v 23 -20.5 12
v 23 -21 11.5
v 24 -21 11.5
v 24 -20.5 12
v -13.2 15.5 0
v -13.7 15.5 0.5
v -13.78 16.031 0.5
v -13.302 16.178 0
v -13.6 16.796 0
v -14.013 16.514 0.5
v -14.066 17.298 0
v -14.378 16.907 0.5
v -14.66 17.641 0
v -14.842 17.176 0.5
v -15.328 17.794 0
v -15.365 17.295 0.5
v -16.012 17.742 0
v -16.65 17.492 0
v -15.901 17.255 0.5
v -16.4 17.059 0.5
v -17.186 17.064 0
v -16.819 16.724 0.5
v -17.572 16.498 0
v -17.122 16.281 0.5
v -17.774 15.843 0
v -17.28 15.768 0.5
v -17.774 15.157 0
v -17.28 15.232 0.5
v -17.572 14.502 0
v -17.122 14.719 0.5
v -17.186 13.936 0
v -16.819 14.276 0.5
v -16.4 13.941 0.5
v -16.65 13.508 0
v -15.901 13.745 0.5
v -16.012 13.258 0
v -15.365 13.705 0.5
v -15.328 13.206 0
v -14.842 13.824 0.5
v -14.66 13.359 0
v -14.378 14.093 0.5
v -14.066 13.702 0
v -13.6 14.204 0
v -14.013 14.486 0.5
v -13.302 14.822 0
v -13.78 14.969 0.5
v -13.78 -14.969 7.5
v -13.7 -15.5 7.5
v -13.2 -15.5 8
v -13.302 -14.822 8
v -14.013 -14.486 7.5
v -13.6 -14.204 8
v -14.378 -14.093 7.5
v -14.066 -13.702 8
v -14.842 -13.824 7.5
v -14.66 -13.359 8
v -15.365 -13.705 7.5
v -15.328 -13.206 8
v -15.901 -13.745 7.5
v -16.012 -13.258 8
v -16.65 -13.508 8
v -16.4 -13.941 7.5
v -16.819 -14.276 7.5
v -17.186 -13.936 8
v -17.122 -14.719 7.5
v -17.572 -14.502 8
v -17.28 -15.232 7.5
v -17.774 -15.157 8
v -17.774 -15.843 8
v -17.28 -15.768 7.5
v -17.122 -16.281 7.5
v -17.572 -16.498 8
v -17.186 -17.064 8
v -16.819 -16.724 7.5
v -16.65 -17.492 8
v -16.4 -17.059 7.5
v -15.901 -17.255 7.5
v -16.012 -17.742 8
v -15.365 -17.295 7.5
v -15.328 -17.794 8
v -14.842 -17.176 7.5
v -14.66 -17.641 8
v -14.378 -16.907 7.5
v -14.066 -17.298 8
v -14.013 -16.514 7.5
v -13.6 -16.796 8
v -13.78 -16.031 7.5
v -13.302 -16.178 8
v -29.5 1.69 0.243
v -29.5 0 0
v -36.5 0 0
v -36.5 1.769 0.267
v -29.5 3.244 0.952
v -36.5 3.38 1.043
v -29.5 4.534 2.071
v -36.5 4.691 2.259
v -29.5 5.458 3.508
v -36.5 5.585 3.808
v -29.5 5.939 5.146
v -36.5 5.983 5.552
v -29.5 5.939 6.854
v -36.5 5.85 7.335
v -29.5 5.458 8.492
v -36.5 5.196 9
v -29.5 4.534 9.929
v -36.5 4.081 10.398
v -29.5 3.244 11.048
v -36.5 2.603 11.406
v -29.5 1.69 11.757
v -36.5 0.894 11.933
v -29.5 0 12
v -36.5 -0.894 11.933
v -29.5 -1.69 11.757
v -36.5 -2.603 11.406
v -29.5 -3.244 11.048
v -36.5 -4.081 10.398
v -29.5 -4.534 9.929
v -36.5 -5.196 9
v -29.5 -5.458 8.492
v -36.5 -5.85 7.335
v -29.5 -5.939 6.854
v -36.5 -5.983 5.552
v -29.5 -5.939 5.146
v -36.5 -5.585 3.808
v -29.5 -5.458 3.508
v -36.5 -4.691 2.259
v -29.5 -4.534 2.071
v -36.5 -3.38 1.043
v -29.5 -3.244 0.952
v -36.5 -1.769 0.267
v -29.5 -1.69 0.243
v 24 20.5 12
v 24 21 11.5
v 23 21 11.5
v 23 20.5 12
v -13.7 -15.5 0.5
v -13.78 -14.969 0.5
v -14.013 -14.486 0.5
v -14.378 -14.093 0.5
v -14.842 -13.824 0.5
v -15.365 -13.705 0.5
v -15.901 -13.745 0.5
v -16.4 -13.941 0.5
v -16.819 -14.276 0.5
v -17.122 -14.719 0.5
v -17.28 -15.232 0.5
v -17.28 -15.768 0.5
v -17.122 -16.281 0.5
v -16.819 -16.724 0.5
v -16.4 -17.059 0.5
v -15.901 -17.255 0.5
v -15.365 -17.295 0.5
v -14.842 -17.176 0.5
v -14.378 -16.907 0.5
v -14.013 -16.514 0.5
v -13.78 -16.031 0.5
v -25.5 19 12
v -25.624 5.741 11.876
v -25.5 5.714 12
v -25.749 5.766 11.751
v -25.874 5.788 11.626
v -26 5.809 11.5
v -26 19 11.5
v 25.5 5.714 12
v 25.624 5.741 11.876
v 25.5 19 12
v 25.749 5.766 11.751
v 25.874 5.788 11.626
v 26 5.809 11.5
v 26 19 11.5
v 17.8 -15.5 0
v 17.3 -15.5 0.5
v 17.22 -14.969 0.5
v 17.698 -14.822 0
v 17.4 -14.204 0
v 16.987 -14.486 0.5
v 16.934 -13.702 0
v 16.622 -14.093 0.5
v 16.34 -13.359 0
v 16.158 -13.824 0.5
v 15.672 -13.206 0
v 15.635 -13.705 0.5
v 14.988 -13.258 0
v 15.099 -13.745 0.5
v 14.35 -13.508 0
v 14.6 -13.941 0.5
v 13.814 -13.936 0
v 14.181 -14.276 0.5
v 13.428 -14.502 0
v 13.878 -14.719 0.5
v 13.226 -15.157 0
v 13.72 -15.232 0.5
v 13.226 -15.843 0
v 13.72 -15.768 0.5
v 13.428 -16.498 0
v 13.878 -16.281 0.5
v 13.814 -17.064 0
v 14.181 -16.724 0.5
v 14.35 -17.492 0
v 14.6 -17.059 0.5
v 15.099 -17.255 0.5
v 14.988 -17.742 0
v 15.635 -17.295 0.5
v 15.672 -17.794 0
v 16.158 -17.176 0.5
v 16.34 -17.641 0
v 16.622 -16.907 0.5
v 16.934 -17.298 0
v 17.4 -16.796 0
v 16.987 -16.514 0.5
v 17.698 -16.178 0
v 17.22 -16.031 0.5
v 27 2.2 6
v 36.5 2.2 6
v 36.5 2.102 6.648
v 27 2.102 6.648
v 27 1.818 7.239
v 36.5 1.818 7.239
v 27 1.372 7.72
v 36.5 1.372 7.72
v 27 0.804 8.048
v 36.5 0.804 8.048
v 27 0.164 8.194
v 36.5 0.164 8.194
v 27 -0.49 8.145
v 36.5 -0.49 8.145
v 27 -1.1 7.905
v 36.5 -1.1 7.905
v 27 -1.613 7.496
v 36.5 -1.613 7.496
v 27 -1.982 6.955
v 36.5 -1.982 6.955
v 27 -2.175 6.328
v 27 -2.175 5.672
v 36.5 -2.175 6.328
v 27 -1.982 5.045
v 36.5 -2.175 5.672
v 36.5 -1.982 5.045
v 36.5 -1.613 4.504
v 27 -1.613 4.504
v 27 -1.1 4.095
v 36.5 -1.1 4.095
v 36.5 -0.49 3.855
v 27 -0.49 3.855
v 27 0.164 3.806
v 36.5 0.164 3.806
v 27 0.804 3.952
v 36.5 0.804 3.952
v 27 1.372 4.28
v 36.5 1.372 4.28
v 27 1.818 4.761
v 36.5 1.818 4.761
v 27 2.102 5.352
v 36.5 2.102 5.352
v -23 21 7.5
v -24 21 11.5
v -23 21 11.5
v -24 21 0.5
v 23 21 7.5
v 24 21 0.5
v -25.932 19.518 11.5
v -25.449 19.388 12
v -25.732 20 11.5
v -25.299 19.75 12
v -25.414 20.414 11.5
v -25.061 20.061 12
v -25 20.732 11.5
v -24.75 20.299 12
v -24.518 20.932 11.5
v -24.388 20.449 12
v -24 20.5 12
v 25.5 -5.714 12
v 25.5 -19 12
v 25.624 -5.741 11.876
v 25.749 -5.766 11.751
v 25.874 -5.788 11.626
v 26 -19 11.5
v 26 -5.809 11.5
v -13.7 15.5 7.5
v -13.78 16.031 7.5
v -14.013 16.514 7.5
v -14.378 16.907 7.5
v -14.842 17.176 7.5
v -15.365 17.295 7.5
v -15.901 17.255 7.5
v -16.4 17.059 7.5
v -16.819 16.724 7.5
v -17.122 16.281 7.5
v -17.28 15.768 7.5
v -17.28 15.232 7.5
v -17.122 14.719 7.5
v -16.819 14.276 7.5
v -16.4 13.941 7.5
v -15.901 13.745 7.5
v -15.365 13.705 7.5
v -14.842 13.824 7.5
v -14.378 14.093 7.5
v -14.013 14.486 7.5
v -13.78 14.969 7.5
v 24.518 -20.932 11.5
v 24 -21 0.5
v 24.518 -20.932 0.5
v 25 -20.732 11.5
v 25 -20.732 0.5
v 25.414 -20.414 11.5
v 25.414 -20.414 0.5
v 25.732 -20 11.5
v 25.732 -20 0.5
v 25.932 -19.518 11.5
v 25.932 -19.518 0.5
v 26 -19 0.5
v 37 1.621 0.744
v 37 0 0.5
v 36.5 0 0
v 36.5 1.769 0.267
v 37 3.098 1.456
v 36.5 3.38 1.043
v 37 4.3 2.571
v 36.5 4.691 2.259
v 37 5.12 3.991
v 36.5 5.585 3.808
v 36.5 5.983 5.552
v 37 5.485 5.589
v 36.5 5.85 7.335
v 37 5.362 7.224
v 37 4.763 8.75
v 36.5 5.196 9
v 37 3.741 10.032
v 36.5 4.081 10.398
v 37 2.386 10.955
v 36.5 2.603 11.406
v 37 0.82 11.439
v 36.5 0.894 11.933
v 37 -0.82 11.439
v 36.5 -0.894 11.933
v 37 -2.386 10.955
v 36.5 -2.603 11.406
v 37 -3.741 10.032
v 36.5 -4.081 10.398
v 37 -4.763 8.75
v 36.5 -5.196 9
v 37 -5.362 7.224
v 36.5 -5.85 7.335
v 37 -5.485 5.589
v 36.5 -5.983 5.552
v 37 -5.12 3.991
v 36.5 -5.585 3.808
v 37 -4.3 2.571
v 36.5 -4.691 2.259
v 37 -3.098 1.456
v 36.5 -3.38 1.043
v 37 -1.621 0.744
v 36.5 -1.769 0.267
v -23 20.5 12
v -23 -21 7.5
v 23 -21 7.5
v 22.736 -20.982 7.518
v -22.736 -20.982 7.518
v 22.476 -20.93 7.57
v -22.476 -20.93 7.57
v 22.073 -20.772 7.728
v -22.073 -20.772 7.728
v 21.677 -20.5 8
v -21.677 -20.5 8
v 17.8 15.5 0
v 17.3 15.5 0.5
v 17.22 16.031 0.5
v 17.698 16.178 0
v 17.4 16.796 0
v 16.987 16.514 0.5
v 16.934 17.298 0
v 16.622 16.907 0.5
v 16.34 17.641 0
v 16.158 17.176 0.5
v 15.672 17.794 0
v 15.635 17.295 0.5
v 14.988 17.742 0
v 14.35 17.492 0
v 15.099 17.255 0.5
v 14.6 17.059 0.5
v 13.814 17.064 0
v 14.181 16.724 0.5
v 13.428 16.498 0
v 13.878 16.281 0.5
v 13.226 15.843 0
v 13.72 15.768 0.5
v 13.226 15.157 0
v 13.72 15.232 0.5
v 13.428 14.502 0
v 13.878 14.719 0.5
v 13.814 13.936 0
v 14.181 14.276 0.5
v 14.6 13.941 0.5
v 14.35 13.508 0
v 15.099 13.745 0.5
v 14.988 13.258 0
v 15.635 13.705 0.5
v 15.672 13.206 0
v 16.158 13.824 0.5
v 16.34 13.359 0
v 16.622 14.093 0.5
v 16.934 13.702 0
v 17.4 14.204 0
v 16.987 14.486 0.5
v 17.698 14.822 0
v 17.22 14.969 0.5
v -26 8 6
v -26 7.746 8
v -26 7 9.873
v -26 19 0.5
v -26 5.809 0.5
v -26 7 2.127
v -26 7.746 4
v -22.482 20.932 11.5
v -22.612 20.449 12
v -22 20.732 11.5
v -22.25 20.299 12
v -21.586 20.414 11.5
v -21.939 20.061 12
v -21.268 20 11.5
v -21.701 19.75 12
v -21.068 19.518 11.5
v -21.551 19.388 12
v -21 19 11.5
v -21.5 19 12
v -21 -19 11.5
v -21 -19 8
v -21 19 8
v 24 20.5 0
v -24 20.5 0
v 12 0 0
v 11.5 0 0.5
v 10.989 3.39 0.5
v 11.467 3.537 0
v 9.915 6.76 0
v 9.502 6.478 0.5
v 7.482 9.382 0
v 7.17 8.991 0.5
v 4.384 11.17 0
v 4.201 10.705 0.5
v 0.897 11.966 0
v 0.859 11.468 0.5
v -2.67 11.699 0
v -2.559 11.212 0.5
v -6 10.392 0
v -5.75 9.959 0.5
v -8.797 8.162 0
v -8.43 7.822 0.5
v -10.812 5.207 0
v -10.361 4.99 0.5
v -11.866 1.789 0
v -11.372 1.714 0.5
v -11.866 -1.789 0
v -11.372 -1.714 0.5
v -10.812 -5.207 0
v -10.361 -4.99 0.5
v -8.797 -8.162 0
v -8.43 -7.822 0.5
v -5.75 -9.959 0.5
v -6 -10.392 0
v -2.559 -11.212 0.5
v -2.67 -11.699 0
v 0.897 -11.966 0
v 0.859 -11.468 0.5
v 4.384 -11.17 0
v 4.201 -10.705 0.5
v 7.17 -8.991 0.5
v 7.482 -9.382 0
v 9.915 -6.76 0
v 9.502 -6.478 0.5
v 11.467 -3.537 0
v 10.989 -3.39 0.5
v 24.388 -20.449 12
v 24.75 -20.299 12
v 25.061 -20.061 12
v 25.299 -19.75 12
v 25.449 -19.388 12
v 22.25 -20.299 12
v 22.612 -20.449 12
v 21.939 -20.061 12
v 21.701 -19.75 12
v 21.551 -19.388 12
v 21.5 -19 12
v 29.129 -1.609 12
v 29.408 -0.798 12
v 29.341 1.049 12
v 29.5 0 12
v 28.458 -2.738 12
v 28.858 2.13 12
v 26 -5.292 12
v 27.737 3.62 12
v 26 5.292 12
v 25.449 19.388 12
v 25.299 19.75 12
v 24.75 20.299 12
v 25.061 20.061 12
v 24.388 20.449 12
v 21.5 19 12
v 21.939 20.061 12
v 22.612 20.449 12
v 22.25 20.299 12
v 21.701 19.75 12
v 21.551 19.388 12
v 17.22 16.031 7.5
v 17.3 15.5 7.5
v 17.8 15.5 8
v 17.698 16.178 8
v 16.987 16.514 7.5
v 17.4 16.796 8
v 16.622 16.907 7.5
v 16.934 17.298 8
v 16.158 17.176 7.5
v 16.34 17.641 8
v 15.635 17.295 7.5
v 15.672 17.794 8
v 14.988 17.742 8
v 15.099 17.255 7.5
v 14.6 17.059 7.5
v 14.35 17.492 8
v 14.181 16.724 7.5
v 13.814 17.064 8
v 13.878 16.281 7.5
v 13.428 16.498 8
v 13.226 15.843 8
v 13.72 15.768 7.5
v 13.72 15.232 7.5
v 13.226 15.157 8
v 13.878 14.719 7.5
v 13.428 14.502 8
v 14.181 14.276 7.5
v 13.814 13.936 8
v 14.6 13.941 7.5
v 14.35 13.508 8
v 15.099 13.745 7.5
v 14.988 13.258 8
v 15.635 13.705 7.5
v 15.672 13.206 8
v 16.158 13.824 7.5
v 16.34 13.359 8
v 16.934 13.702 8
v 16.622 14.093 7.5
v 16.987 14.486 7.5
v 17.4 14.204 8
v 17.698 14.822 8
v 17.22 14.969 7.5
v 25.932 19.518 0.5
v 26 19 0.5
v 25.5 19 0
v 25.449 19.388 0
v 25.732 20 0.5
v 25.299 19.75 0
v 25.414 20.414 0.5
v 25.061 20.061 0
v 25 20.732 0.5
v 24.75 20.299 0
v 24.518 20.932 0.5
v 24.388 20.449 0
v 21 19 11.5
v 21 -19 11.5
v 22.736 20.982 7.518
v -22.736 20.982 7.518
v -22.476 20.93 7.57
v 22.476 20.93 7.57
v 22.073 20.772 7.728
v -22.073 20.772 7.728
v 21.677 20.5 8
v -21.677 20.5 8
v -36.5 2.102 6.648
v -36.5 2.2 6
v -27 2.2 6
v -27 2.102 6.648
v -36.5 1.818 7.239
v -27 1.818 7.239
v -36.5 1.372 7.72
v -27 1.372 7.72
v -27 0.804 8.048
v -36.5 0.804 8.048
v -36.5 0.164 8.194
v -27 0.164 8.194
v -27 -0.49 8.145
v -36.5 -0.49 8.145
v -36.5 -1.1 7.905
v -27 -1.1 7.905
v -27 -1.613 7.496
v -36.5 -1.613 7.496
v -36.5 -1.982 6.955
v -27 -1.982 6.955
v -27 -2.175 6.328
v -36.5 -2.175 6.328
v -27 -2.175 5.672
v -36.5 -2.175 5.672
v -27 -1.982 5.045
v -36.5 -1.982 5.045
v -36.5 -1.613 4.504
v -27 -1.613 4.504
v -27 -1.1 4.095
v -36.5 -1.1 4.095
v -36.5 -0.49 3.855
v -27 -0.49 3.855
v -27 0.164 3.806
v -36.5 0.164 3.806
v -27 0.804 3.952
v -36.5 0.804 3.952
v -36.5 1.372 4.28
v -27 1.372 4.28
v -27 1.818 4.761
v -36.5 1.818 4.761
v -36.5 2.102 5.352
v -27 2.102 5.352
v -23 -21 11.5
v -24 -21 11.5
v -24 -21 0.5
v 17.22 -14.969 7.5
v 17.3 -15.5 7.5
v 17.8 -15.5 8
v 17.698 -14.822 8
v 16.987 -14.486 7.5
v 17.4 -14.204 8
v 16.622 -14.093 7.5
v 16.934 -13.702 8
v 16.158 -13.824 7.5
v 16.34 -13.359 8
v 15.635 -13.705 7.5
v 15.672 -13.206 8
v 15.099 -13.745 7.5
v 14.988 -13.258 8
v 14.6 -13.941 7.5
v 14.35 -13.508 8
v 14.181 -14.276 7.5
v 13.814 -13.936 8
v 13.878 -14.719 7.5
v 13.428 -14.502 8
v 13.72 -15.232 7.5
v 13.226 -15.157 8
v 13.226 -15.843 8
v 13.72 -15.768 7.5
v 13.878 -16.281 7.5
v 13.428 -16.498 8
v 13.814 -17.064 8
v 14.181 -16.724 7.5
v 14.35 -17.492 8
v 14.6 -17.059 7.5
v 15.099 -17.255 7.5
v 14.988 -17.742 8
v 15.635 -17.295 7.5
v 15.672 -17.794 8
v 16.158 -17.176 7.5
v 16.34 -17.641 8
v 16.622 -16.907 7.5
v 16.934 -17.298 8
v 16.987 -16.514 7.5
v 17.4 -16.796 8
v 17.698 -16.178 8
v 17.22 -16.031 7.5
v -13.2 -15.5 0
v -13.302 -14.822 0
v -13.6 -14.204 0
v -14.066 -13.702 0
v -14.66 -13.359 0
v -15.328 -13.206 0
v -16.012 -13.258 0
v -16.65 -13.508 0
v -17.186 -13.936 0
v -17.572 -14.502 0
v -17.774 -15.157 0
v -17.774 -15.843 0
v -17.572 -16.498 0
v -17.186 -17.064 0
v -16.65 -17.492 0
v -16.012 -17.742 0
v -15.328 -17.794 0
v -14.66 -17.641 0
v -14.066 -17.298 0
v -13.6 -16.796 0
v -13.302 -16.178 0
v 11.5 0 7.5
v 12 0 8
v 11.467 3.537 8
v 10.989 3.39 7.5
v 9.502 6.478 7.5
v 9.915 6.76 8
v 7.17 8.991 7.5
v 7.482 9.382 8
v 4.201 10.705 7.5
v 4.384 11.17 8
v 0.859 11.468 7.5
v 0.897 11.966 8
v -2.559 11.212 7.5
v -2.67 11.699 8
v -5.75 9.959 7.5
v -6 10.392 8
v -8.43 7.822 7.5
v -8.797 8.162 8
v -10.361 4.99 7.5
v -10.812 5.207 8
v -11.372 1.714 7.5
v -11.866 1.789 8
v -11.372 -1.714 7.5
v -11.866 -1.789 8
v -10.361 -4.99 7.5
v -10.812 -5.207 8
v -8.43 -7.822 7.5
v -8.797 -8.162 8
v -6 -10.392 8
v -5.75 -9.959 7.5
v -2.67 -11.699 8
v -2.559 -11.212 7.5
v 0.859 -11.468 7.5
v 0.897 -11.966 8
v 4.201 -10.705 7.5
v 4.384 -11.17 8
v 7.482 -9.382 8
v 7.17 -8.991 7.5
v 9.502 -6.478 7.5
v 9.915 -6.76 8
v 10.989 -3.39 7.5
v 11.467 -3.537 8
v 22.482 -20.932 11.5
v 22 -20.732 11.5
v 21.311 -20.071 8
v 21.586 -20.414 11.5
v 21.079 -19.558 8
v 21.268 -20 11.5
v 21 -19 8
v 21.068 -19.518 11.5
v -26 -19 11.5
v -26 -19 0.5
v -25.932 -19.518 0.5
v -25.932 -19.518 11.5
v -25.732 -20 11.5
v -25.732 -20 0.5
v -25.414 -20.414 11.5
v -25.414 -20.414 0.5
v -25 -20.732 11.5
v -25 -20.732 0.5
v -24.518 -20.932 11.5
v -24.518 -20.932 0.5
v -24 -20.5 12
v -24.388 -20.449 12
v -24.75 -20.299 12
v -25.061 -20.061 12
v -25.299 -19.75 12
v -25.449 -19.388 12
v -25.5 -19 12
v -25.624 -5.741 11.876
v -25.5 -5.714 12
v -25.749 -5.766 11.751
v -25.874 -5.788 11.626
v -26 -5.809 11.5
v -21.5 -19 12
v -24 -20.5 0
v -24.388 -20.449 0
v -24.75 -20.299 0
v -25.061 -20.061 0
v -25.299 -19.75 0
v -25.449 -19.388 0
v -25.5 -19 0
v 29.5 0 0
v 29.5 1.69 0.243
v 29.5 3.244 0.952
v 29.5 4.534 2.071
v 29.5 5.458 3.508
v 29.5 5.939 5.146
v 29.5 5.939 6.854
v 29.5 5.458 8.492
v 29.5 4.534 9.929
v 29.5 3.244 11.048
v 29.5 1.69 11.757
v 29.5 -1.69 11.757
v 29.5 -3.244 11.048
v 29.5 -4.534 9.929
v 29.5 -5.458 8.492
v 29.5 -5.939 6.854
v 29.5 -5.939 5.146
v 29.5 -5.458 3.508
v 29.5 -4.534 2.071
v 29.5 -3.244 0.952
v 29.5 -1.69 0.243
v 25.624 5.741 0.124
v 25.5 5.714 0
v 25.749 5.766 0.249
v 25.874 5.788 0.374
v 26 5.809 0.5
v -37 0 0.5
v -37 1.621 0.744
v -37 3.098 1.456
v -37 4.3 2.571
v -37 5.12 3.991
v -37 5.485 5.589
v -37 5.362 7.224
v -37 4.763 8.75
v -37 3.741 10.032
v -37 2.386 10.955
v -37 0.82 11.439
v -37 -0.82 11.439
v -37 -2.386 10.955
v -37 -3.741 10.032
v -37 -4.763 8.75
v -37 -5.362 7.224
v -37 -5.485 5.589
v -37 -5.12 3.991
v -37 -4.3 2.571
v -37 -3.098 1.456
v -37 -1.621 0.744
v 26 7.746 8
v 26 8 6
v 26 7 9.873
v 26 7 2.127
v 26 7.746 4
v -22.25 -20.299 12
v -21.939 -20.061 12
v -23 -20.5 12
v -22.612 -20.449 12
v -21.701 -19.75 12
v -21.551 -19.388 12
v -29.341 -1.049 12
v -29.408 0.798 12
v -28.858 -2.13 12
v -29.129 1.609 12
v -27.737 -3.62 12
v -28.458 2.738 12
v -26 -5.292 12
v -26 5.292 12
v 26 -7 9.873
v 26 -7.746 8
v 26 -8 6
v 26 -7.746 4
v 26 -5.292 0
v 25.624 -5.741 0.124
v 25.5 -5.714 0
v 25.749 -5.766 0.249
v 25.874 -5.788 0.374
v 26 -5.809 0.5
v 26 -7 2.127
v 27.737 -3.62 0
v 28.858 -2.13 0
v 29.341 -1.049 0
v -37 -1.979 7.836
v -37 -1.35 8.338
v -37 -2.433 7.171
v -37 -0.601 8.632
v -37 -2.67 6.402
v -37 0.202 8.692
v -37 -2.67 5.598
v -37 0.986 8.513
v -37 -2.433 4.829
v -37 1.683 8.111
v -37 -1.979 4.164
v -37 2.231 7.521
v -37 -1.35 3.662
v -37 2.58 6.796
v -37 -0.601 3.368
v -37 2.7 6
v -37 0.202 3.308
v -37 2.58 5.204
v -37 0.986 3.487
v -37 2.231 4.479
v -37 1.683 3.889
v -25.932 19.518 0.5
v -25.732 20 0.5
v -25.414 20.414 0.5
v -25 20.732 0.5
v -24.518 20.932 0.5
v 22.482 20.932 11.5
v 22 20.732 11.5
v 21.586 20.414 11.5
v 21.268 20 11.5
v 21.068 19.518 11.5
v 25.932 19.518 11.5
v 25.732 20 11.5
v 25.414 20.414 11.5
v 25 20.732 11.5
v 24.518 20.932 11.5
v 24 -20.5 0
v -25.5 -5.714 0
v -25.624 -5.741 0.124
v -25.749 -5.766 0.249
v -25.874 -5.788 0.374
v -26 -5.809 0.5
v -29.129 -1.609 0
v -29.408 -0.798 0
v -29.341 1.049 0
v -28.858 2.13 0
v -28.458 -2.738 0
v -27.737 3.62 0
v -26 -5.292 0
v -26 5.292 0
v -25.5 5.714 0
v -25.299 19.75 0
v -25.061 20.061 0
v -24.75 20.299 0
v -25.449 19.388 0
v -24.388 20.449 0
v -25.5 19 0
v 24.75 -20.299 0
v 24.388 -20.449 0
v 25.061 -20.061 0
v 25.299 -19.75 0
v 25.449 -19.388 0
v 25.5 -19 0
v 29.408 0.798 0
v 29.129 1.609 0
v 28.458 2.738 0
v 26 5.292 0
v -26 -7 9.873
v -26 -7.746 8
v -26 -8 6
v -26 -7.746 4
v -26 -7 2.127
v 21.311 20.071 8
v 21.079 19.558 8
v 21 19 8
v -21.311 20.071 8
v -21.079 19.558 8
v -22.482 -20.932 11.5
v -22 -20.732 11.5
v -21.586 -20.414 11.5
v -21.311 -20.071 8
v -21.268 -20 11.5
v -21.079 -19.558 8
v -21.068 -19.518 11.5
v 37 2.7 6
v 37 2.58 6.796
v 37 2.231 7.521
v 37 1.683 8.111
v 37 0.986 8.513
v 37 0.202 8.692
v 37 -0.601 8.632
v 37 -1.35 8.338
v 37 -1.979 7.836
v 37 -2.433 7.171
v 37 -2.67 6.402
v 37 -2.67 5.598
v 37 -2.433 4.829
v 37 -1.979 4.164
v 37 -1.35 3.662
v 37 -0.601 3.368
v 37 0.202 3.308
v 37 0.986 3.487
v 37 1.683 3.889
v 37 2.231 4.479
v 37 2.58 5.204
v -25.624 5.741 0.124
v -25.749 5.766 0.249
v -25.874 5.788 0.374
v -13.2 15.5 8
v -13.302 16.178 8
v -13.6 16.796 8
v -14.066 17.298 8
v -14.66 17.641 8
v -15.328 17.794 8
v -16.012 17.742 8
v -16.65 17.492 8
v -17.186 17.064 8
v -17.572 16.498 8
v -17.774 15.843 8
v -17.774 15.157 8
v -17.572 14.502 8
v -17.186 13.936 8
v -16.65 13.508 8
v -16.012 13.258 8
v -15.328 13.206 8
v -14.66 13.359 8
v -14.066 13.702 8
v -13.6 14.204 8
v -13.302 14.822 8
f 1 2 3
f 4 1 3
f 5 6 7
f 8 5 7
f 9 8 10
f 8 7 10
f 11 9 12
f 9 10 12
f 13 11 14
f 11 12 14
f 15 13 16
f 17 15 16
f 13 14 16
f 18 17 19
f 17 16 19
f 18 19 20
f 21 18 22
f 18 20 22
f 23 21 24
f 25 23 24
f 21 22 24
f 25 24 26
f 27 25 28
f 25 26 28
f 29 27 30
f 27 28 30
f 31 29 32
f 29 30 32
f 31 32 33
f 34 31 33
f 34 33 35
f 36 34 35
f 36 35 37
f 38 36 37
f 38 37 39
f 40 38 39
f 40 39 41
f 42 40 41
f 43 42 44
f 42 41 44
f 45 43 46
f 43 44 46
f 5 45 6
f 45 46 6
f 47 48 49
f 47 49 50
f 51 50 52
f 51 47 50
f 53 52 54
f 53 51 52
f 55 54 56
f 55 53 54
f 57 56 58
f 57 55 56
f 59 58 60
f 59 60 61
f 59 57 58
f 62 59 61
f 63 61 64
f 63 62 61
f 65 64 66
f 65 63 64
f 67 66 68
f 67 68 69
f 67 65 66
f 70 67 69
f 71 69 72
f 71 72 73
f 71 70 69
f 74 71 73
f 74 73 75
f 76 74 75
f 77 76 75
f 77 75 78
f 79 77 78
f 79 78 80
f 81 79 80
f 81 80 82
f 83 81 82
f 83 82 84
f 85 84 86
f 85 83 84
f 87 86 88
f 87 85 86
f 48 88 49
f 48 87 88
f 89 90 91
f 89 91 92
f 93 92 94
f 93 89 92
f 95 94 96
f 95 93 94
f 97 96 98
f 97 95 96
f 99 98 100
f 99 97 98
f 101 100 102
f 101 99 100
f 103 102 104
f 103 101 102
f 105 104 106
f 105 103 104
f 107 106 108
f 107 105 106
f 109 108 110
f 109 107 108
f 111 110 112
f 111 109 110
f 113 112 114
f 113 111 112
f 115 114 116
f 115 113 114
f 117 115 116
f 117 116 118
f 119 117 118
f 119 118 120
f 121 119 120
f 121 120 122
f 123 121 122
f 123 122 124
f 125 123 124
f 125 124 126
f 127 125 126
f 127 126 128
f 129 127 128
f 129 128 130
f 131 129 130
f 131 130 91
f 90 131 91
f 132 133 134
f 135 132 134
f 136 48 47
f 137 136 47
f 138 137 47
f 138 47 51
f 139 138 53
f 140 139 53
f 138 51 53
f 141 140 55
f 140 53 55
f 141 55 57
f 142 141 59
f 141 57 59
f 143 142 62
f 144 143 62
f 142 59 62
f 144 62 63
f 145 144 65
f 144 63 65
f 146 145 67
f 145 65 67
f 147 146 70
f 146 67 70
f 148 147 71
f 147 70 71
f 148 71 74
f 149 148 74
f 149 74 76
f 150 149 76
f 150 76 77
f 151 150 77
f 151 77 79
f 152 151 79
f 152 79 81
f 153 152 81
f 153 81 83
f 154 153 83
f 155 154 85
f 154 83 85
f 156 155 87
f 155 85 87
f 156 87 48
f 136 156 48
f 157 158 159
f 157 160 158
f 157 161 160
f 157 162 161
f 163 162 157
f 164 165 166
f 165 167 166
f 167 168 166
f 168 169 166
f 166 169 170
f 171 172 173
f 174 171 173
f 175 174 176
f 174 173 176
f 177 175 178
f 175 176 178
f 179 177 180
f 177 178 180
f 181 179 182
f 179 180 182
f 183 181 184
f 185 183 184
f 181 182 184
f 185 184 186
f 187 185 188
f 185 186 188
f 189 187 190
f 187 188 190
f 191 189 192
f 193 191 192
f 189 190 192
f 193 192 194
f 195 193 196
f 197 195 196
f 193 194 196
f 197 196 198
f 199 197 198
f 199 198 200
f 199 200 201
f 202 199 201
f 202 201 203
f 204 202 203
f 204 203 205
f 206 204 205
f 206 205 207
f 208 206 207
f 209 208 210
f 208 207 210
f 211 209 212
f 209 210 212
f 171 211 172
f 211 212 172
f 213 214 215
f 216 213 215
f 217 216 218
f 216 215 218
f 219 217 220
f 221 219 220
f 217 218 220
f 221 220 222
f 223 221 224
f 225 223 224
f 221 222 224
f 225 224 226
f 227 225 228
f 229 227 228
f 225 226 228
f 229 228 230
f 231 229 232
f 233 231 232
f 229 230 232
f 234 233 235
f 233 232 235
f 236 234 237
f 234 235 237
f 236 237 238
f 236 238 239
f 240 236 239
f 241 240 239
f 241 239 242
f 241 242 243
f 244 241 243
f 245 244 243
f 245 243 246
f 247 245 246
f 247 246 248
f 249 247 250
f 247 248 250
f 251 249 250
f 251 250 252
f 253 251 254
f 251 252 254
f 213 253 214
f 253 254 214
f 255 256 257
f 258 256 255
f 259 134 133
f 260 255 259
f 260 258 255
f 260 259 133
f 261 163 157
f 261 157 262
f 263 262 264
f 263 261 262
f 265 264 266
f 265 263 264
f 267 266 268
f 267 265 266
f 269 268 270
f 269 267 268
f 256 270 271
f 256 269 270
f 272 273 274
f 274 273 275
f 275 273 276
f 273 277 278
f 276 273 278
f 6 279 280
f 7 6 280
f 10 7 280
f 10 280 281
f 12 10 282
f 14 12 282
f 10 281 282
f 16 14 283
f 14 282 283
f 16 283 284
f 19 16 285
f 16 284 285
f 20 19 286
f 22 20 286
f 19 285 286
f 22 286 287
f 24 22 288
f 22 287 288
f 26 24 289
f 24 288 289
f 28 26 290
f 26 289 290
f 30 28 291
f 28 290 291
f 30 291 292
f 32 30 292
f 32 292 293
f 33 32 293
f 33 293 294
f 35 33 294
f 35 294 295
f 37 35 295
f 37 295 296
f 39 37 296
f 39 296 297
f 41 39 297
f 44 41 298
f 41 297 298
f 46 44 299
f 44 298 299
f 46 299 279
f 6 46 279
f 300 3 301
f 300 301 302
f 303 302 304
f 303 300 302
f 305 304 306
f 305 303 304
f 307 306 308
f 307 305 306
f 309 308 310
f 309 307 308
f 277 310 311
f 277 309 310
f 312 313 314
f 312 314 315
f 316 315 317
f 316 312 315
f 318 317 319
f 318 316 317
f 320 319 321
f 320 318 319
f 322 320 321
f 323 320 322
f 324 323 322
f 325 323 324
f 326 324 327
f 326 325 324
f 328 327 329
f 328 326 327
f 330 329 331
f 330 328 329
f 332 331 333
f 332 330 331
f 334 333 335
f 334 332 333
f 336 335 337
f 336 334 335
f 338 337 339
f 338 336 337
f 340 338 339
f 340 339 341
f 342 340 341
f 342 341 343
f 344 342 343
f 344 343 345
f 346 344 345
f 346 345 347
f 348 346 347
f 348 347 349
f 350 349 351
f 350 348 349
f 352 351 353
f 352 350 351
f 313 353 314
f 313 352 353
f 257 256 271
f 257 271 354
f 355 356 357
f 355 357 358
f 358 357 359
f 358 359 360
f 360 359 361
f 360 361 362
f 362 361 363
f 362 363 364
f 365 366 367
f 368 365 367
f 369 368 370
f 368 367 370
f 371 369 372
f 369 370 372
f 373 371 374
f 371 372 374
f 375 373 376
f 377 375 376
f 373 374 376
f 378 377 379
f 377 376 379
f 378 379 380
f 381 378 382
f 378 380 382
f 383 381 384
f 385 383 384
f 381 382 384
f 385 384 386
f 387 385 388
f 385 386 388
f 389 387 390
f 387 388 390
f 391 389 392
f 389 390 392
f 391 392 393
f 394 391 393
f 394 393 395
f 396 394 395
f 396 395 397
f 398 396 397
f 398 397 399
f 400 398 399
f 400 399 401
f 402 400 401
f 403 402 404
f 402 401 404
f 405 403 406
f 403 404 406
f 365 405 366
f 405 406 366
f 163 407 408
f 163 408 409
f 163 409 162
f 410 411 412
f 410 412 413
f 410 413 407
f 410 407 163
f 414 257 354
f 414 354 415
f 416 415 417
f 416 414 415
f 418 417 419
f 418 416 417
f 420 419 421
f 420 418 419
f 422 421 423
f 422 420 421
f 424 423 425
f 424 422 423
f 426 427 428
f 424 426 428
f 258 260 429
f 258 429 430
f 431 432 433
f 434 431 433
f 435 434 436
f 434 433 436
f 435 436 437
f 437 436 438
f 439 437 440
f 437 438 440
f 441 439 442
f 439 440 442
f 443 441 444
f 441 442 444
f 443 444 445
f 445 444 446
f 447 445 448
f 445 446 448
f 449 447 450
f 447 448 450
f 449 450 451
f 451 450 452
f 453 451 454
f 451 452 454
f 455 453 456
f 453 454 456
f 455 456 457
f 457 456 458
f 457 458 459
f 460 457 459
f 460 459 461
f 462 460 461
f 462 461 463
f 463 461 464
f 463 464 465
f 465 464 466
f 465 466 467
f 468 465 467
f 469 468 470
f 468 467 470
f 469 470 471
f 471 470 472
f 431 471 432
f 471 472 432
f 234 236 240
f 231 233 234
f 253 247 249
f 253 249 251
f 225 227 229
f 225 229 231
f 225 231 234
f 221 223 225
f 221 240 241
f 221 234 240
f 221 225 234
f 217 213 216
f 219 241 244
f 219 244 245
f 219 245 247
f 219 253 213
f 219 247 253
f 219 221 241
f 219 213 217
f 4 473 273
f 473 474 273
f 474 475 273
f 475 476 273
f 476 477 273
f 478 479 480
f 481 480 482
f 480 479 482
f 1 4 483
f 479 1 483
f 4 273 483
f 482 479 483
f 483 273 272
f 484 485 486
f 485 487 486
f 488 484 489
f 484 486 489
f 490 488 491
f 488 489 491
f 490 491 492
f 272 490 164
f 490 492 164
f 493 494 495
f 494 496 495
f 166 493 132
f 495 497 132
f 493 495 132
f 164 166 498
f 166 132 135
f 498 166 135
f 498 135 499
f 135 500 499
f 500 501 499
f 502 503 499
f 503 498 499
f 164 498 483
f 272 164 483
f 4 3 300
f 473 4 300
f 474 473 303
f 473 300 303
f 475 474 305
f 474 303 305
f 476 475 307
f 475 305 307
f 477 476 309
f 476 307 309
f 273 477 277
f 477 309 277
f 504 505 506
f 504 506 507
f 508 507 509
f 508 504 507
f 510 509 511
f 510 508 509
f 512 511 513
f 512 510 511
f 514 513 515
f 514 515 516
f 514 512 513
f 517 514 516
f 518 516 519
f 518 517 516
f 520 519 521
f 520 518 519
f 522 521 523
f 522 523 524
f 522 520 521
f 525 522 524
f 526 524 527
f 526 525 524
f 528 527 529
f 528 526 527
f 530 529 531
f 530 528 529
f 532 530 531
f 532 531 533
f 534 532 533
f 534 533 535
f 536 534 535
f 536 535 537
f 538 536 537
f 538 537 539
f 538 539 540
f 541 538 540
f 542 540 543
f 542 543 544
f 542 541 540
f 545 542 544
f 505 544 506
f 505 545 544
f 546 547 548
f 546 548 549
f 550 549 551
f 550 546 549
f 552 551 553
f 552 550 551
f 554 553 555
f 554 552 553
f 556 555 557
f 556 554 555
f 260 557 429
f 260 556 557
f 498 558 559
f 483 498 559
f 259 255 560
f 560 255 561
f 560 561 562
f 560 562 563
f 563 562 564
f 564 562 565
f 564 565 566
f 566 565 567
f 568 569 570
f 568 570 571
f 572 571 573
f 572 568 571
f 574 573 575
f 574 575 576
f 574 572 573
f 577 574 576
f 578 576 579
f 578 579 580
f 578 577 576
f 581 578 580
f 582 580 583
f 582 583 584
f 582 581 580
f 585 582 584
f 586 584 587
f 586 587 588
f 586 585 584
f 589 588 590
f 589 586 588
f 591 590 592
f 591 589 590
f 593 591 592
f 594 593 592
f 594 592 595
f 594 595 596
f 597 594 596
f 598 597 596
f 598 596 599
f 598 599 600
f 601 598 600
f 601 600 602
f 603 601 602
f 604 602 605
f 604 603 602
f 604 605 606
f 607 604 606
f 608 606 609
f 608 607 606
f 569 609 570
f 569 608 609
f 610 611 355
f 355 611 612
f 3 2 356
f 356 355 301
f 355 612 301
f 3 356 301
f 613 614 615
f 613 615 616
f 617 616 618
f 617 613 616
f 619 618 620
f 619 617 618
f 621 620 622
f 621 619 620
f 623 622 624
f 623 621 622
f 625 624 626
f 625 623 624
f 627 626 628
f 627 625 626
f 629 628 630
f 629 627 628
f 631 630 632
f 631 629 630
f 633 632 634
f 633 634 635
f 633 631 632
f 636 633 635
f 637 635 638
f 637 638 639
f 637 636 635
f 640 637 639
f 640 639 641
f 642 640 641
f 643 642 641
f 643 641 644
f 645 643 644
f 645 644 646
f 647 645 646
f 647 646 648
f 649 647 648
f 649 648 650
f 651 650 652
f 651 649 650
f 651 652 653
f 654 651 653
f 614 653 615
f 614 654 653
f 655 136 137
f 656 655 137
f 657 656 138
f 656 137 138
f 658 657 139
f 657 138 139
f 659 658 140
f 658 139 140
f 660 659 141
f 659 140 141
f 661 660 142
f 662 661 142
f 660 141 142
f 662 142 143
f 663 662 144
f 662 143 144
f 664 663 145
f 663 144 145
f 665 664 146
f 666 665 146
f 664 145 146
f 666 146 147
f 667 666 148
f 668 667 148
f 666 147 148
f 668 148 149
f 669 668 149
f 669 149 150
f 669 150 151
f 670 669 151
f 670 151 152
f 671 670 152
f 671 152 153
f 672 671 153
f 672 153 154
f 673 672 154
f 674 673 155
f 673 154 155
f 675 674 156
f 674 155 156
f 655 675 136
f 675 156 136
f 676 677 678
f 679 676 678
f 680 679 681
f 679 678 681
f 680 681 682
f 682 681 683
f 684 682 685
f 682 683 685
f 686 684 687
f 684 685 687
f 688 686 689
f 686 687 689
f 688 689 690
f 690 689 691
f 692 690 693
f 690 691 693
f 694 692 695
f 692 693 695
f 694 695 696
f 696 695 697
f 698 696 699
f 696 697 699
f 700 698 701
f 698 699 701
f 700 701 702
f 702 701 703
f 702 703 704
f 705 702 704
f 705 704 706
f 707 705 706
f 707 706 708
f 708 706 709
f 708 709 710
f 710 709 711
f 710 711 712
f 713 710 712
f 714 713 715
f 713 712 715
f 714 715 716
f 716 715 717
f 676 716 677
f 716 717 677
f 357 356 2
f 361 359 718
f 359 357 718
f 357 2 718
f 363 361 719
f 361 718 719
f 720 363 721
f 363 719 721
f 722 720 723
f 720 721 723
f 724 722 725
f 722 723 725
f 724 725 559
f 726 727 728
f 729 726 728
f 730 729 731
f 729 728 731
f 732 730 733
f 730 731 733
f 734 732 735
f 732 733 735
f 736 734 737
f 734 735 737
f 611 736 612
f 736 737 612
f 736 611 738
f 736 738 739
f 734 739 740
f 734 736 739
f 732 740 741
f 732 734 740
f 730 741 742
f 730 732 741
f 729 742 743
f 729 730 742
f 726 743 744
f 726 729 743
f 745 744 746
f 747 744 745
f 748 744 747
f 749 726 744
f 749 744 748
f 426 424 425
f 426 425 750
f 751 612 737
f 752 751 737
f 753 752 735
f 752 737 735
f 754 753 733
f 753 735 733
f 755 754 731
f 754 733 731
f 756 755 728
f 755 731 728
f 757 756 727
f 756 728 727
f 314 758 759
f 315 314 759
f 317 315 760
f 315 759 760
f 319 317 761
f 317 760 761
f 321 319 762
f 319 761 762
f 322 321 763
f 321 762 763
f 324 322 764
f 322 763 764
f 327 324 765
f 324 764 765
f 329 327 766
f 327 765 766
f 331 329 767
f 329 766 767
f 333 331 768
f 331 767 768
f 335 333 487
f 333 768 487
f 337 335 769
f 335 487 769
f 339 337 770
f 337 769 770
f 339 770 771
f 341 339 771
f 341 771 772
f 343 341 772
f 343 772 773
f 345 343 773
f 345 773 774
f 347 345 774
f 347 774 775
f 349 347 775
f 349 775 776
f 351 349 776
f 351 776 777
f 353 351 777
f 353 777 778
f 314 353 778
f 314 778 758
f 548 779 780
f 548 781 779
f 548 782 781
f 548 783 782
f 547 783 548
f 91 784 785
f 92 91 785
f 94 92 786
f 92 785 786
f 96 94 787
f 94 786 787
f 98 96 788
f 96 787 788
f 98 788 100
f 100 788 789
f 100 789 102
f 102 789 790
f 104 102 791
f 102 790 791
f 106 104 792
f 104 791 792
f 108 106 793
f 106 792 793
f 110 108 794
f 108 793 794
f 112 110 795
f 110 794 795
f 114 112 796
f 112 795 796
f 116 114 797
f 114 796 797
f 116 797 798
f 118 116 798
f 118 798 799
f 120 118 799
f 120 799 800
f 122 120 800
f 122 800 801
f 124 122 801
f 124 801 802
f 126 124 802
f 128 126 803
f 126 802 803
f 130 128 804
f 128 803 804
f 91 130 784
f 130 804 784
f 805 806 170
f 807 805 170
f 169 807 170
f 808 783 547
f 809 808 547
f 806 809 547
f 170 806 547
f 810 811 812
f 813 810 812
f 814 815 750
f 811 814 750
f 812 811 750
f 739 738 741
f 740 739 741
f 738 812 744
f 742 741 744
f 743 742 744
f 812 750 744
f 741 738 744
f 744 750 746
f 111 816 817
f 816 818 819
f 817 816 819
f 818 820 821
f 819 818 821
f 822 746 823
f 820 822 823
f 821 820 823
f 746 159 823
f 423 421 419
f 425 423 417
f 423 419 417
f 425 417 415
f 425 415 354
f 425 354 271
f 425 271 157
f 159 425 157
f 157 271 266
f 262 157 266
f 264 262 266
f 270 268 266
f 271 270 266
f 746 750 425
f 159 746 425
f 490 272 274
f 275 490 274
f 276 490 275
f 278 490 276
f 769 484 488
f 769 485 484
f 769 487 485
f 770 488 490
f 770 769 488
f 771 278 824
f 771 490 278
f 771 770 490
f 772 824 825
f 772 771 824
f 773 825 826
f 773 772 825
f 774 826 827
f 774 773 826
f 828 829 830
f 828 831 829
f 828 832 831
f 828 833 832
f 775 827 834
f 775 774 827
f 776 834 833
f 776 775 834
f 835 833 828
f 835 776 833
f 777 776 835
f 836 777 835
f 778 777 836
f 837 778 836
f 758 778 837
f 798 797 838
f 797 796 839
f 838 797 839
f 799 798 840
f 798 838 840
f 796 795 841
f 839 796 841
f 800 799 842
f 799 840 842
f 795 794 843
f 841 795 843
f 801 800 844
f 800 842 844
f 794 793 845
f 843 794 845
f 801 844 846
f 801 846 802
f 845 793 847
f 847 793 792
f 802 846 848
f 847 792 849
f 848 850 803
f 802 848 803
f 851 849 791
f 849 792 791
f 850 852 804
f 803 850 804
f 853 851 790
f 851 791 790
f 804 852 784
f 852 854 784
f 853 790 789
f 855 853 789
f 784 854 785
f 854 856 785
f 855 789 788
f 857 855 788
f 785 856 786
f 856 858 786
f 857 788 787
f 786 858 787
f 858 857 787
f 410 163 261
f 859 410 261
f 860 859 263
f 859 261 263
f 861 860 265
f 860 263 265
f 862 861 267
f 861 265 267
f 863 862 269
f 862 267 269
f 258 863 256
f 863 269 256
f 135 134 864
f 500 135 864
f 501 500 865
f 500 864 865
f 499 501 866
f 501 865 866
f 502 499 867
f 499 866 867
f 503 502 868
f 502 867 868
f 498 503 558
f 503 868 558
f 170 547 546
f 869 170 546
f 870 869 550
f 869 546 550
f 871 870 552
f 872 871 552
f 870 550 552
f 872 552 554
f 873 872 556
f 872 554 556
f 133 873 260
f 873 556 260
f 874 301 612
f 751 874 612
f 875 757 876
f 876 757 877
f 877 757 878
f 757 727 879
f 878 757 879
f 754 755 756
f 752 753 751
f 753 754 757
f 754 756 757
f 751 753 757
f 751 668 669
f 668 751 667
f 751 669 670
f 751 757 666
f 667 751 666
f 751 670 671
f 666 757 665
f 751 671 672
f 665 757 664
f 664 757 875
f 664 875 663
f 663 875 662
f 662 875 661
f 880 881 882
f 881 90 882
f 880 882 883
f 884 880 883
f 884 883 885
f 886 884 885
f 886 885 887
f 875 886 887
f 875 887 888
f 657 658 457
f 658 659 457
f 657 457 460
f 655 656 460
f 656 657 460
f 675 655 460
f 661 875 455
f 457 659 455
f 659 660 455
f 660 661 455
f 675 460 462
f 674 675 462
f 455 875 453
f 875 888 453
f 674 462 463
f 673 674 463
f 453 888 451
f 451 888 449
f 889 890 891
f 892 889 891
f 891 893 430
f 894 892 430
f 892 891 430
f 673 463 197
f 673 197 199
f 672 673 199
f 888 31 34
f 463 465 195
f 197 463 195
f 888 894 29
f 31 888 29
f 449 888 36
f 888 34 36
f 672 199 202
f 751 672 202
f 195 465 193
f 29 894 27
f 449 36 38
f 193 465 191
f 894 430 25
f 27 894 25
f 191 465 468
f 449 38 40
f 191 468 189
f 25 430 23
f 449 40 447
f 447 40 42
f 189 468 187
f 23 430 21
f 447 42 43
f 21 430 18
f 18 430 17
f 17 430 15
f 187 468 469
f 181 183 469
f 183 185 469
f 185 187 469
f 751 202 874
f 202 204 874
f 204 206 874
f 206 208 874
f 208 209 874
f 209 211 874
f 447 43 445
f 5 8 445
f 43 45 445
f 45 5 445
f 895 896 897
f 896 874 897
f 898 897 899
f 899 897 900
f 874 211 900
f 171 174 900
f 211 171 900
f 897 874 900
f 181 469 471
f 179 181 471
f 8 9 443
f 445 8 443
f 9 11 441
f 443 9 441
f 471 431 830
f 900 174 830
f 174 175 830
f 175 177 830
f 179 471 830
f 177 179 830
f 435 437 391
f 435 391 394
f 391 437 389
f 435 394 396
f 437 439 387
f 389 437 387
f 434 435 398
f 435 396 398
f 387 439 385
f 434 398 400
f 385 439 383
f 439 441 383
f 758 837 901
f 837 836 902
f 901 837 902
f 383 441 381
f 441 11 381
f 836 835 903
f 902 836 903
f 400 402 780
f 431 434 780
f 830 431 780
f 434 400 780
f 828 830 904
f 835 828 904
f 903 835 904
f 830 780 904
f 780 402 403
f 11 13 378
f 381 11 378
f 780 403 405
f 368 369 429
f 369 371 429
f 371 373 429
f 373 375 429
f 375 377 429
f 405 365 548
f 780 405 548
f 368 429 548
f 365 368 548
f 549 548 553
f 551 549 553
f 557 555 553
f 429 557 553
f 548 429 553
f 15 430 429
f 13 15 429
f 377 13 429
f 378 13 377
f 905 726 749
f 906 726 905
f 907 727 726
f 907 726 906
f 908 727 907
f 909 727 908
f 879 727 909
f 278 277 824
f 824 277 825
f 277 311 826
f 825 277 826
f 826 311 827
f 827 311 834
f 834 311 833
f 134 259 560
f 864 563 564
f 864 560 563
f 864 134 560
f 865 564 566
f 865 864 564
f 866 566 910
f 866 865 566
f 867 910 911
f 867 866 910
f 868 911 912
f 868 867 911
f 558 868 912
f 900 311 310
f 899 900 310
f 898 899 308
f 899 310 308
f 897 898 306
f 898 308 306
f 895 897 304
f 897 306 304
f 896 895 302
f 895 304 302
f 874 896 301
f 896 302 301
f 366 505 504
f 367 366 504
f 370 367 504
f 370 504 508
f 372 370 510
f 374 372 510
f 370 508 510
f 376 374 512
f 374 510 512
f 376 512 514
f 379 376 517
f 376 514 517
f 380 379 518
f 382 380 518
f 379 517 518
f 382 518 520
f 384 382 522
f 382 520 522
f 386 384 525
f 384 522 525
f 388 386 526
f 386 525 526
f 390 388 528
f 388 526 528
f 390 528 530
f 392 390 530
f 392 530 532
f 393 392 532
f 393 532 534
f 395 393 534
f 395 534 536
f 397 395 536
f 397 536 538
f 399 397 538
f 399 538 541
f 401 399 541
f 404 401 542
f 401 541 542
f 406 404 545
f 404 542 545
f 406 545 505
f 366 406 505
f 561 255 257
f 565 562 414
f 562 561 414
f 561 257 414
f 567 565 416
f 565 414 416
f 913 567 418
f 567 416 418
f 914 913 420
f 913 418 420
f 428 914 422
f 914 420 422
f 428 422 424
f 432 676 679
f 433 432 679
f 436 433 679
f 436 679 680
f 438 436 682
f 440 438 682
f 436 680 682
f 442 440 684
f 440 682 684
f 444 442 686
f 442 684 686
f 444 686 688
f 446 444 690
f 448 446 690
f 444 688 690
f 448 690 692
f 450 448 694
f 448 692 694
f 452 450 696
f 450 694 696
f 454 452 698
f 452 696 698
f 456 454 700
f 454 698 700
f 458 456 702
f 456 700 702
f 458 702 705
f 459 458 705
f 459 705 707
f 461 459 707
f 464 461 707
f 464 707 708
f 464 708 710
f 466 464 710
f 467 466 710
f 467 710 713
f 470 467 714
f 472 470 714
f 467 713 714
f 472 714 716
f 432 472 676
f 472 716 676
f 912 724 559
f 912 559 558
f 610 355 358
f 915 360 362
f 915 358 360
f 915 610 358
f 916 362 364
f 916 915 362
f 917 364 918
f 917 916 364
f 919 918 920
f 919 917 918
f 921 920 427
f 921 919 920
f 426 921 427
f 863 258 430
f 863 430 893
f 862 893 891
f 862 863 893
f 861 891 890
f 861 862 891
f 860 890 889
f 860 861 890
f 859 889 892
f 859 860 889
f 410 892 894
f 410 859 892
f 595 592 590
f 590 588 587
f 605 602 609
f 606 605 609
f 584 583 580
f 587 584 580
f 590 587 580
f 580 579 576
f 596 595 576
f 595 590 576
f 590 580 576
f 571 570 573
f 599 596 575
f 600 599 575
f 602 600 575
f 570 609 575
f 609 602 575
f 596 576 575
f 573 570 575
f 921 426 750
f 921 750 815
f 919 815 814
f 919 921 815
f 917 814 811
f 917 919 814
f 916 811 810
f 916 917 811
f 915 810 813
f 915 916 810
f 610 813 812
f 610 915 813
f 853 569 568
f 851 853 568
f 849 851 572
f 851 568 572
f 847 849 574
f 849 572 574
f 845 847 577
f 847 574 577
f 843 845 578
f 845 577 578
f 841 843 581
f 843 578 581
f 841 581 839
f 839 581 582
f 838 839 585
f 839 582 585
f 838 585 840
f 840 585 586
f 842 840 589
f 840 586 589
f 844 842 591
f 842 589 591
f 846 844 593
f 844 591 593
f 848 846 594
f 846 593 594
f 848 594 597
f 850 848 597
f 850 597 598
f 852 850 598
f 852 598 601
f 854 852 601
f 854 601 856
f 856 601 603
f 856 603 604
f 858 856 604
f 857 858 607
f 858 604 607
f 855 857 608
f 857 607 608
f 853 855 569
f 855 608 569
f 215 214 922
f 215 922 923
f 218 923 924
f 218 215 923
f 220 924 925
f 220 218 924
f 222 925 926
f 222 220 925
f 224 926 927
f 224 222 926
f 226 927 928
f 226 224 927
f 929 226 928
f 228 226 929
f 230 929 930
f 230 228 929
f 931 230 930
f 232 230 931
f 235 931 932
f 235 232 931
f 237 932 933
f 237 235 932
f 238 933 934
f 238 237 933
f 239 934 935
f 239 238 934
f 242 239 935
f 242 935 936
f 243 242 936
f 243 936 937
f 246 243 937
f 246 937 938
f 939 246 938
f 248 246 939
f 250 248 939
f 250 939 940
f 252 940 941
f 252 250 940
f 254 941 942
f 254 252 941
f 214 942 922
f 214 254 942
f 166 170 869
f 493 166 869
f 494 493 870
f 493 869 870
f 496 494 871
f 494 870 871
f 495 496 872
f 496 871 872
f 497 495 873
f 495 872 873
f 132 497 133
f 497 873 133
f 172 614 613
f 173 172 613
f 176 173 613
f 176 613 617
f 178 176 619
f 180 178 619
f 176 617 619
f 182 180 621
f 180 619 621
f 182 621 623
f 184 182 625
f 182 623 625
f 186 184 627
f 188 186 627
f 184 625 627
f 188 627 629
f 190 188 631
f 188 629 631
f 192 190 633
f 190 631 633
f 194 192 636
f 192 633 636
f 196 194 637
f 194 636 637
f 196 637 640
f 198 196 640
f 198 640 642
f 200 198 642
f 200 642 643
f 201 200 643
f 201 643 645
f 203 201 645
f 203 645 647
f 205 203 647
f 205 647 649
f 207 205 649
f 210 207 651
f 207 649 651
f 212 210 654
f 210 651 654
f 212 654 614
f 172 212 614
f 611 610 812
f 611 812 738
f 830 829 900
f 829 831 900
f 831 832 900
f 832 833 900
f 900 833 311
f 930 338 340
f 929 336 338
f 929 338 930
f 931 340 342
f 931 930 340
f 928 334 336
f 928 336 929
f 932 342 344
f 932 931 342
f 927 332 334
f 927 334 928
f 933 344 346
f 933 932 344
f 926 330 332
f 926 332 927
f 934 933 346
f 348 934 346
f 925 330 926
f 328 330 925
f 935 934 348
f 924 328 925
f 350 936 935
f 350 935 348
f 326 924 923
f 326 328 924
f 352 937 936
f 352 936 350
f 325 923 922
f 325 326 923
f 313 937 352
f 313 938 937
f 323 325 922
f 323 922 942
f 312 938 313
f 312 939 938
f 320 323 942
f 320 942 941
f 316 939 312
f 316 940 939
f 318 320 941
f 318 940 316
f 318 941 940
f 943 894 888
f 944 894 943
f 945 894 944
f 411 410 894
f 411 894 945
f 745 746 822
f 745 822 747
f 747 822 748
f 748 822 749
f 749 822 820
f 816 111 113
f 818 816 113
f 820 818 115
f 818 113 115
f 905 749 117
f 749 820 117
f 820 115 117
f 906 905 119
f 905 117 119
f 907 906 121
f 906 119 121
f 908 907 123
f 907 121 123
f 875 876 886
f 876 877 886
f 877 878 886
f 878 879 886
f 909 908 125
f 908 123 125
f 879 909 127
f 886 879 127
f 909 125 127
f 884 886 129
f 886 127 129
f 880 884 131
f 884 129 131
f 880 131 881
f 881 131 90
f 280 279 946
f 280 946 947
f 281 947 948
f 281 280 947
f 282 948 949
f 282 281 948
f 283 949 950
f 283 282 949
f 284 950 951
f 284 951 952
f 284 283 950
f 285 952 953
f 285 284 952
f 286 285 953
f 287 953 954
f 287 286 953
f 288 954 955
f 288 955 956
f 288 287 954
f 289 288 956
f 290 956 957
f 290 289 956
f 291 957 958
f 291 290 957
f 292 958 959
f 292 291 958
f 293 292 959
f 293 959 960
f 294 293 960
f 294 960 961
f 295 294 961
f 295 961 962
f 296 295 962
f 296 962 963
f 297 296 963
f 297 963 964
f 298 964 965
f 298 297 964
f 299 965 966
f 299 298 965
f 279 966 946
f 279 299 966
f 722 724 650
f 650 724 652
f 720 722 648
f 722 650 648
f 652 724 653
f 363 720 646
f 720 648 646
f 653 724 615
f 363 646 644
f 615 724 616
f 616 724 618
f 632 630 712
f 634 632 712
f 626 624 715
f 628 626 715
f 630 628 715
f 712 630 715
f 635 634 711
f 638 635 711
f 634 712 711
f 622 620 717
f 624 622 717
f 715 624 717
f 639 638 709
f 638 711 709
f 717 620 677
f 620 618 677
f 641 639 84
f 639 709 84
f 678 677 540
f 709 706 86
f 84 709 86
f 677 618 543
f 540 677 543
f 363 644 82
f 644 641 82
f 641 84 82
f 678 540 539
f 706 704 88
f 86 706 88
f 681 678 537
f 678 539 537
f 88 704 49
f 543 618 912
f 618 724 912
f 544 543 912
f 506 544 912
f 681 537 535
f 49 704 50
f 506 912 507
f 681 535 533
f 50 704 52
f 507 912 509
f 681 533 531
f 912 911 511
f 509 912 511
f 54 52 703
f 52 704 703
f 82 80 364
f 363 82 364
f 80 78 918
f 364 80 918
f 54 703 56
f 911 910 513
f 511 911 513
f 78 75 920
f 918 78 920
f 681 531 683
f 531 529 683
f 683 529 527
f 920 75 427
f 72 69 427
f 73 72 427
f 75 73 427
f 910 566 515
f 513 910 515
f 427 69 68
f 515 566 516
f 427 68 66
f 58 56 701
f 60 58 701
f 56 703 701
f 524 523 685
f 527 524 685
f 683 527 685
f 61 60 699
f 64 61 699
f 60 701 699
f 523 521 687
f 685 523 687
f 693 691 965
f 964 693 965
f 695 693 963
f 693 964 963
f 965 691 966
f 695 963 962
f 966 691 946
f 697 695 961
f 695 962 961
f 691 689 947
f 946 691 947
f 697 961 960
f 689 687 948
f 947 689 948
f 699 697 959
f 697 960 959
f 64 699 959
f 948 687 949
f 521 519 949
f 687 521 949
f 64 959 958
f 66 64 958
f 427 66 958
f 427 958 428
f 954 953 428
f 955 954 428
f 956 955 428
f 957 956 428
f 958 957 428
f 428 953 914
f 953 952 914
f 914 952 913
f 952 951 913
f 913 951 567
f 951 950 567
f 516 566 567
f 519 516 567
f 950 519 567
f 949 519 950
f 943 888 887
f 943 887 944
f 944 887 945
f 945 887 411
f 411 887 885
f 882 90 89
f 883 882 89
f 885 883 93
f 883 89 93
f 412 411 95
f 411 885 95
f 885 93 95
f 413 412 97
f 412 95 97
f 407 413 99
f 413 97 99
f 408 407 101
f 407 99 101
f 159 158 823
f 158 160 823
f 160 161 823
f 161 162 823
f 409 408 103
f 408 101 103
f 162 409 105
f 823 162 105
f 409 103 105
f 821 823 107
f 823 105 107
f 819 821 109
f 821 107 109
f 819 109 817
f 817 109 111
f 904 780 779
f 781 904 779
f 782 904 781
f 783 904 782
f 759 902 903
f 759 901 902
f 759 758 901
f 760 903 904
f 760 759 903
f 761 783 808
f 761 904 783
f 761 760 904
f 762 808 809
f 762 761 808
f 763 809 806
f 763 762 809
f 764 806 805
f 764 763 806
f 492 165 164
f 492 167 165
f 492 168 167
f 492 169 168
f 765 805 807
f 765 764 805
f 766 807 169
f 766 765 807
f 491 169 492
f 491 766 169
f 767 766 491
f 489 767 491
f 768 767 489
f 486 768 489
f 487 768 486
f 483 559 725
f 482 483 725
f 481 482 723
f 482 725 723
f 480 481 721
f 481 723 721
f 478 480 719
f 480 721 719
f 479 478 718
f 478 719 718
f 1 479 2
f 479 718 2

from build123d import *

# Parameters (mm, degrees)
AUFSATZ_LINEAR_AUSTRAGEN1_DEPTH = 8
SKIZZE2_W                       = 5
SKIZZE2_H                       = 42
AUFSATZ_LINEAR_AUSTRAGEN2_DEPTH = 4
SKIZZE3_R                       = 6
AUFSATZ_LINEAR_AUSTRAGEN3_DEPTH = 11
SKIZZE5_R                       = 2.2
SCHNITT_LINEAR_AUSTRAGEN2_DEPTH = 10
SKIZZE4_R                       = 11.5
SKIZZE4_R_2                     = 1.8
SCHNITT_LINEAR_AUSTRAGEN1_DEPTH = 8
FASE1_SIZE                      = 2
FASE1_SIZE_2                    = 3.5
FASE2_SIZE                      = 2
FASE2_SIZE_2                    = 3.5
VERRUNDUNG1_R                   = 2
FASE3_SIZE                      = 0.5


with BuildPart() as part:
    # Skizze1 → Aufsatz-Linear austragen1 (new body)
    with BuildSketch(Plane.XY):
        Polygon((21, 21), (26, 21), (26, -21), (21, -21), (-21, -21), (-26, -21), (-26, 21), (-21, 21), align=None)
    extrude(amount=AUFSATZ_LINEAR_AUSTRAGEN1_DEPTH)

    # Skizze2 → Aufsatz-Linear austragen2 (add)
    with BuildSketch(Plane.XY.offset(8)):
        with Locations((23.5, 0)):
            Rectangle(SKIZZE2_W, SKIZZE2_H)
        with Locations((-23.5, 0)):
            Rectangle(SKIZZE2_W, SKIZZE2_H)
    extrude(amount=AUFSATZ_LINEAR_AUSTRAGEN2_DEPTH)

    # Skizze3 → Aufsatz-Linear austragen3 (add)
    with BuildSketch(Plane(origin=(26, 0, 0), x_dir=(0, 0, -1), z_dir=(1, 0, 0))):
        with Locations((-6, 0)):
            Circle(SKIZZE3_R)
    aufsatz_linear_austragen3 = extrude(amount=AUFSATZ_LINEAR_AUSTRAGEN3_DEPTH)

    # Skizze5 → Schnitt-Linear austragen2 (cut)
    with BuildSketch(Plane(origin=(37, 0, 0), x_dir=(0, 0, -1), z_dir=(1, 0, 0))):
        with Locations(Location((-6, 0, 0), (0, 0, 90))):
            Circle(SKIZZE5_R)
    schnitt_linear_austragen2 = extrude(amount=-SCHNITT_LINEAR_AUSTRAGEN2_DEPTH, mode=Mode.SUBTRACT)

    # Spiegeln1: Aufsatz-Linear austragen3, Schnitt-Linear austragen2 across plane
    add(aufsatz_linear_austragen3.mirror(Plane(origin=(0, 0, 0), x_dir=(0, 0, 1), z_dir=(1, 0, 0))))
    add(schnitt_linear_austragen2.mirror(Plane(origin=(0, 0, 0), x_dir=(0, 0, 1), z_dir=(1, 0, 0))), mode=Mode.SUBTRACT)

    # Skizze4 → Schnitt-Linear austragen1 (cut)
    with BuildSketch(Plane.XY.offset(8)):
        Circle(SKIZZE4_R)
        with Locations((-15.5, 15.5)):
            Circle(SKIZZE4_R_2)
        with Locations((15.5, 15.5)):
            Circle(SKIZZE4_R_2)
        with Locations((15.5, -15.5)):
            Circle(SKIZZE4_R_2)
        with Locations((-15.5, -15.5)):
            Circle(SKIZZE4_R_2)
    extrude(amount=-SCHNITT_LINEAR_AUSTRAGEN1_DEPTH, mode=Mode.SUBTRACT)

    # Fase1
    # the kernel refuses this chamfer: 3.5, 2 mm, written as the material it adds along each edge
    with BuildSketch(Plane(origin=(26, 0, 6), x_dir=(0, 0, -1), z_dir=(0, -1, 0))) as fase1_piece_1_section:
        Polygon((6 + FASE1_SIZE, 0), (6, FASE1_SIZE_2), (6, 0), align=None)
    fase1_piece_1 = revolve(axis=Axis((26, 0, 6), (1, 0, 0)), revolution_arc=180.000000388, mode=Mode.PRIVATE)
    fase1_piece_1 = split(fase1_piece_1, bisect_by=Plane(origin=(27.731298747, 6.967272798, 0), z_dir=(0, 0, 1)), keep=Keep.TOP, mode=Mode.PRIVATE)
    fase1_piece_1 = split(fase1_piece_1, bisect_by=Plane(origin=(27.731298747, 6.967272798, 12), z_dir=(0, 0, -1)), keep=Keep.TOP, mode=Mode.PRIVATE)
    add(fase1_piece_1)
    with BuildSketch(Plane(origin=(26, 0, 6), x_dir=(0, -6.764954696085317e-09, 1.0), z_dir=(0, 1.0, 6.764954696085317e-09))) as fase1_piece_2_section:
        Polygon((6 + FASE1_SIZE, 0), (6, FASE1_SIZE_2), (6, 0), align=None)
    fase1_piece_2 = revolve(axis=Axis((26, 0, 6), (1, 0, 0)), revolution_arc=179.999999612, mode=Mode.PRIVATE)
    fase1_piece_2 = split(fase1_piece_2, bisect_by=Plane(origin=(27.731298743, -6.9672728, 0), z_dir=(0, 0, 1)), keep=Keep.TOP, mode=Mode.PRIVATE)
    fase1_piece_2 = split(fase1_piece_2, bisect_by=Plane(origin=(27.731298743, -6.9672728, 12), z_dir=(0, 0, -1)), keep=Keep.TOP, mode=Mode.PRIVATE)
    add(fase1_piece_2)

    # Fase2
    # the kernel refuses this chamfer: 3.5, 2 mm, written as the material it adds along each edge
    with BuildSketch(Plane(origin=(-26, 0, 6), x_dir=(0, 0, -1), z_dir=(0, -1, 0))) as fase2_piece_1_section:
        Polygon((6 + FASE2_SIZE, 0), (6, -FASE2_SIZE_2), (6, 0), align=None)
    fase2_piece_1 = revolve(axis=Axis((-26, 0, 6), (1, 0, 0)), revolution_arc=180.000000388, mode=Mode.PRIVATE)
    fase2_piece_1 = split(fase2_piece_1, bisect_by=Plane(origin=(-27.731298747, 6.967272798, 0), z_dir=(0, 0, 1)), keep=Keep.TOP, mode=Mode.PRIVATE)
    fase2_piece_1 = split(fase2_piece_1, bisect_by=Plane(origin=(-27.731298747, 6.967272798, 12), z_dir=(0, 0, -1)), keep=Keep.TOP, mode=Mode.PRIVATE)
    add(fase2_piece_1)
    with BuildSketch(Plane(origin=(-26, 0, 6), x_dir=(0, -6.764954696085317e-09, 1.0), z_dir=(0, 1.0, 6.764954696085317e-09))) as fase2_piece_2_section:
        Polygon((6 + FASE2_SIZE, 0), (6, -FASE2_SIZE_2), (6, 0), align=None)
    fase2_piece_2 = revolve(axis=Axis((-26, 0, 6), (1, 0, 0)), revolution_arc=179.999999612, mode=Mode.PRIVATE)
    fase2_piece_2 = split(fase2_piece_2, bisect_by=Plane(origin=(-27.731298743, -6.9672728, 0), z_dir=(0, 0, 1)), keep=Keep.TOP, mode=Mode.PRIVATE)
    fase2_piece_2 = split(fase2_piece_2, bisect_by=Plane(origin=(-27.731298743, -6.9672728, 12), z_dir=(0, 0, -1)), keep=Keep.TOP, mode=Mode.PRIVATE)
    add(fase2_piece_2)

    # Verrundung1
    verrundung1_edges = [part.edges().sort_by_distance(p)[0] for p in [
        (26, 21, 6),
        (26, -21, 6),
        (-26, -21, 6),
        (-26, 21, 6),
        (21, -21, 10),
        (21, 21, 10),
        (-21, 21, 10),
        (-21, -21, 10),
    ]]
    fillet(verrundung1_edges, radius=VERRUNDUNG1_R)

    # Fase3
    fase3_edges = [part.edges().sort_by_distance(p)[0] for p in [
        (-26, -12.145751311, 0),
        (-26, 12.145751311, 12),
        (-21, 0, 12),
        (0, -21, 0),
        (23.5, -21, 12),
        (-23.5, -21, 12),
        (-23.5, 21, 12),
        (-26, -12.145751311, 12),
        (-25.414213562, 20.414213562, 12),
        (-25.414213562, -20.414213562, 12),
        (-21.585786438, 20.414213562, 12),
        (-21.585786438, -20.414213562, 12),
        (21, 0, 12),
        (26, 12.145751311, 12),
        (23.5, 21, 12),
        (25.414213562, 20.414213562, 12),
        (25.414213562, -20.414213562, 12),
        (21.585786438, 20.414213562, 12),
        (21.585786438, -20.414213562, 12),
        (0, 21, 0),
        (-26, 12.145751311, 0),
        (26, -12.145751311, 0),
        (25.414213562, 20.414213562, 0),
        (-25.414213562, 20.414213562, 0),
        (25.414213562, -20.414213562, 0),
        (-25.414213562, -20.414213562, 0),
        (0, 21, 8),
        (0, -21, 8),
        (37, 0, 12),
        (37, -2.2, 6),
        (-37, 0, 12),
        (-37, -2.2, 6),
        (-17.3, -15.5, 0),
        (-17.3, -15.5, 8),
        (13.7, -15.5, 0),
        (13.7, -15.5, 8),
        (13.7, 15.5, 0),
        (13.7, 15.5, 8),
        (-17.3, 15.5, 0),
        (-17.3, 15.5, 8),
        (-11.5, 0, 0),
        (-11.5, 0, 8),
        (26, -12.145751311, 12),
        (26, 12.145751311, 0),
    ]]
    chamfer(fase3_edges, length=FASE3_SIZE)


solid = part.part
